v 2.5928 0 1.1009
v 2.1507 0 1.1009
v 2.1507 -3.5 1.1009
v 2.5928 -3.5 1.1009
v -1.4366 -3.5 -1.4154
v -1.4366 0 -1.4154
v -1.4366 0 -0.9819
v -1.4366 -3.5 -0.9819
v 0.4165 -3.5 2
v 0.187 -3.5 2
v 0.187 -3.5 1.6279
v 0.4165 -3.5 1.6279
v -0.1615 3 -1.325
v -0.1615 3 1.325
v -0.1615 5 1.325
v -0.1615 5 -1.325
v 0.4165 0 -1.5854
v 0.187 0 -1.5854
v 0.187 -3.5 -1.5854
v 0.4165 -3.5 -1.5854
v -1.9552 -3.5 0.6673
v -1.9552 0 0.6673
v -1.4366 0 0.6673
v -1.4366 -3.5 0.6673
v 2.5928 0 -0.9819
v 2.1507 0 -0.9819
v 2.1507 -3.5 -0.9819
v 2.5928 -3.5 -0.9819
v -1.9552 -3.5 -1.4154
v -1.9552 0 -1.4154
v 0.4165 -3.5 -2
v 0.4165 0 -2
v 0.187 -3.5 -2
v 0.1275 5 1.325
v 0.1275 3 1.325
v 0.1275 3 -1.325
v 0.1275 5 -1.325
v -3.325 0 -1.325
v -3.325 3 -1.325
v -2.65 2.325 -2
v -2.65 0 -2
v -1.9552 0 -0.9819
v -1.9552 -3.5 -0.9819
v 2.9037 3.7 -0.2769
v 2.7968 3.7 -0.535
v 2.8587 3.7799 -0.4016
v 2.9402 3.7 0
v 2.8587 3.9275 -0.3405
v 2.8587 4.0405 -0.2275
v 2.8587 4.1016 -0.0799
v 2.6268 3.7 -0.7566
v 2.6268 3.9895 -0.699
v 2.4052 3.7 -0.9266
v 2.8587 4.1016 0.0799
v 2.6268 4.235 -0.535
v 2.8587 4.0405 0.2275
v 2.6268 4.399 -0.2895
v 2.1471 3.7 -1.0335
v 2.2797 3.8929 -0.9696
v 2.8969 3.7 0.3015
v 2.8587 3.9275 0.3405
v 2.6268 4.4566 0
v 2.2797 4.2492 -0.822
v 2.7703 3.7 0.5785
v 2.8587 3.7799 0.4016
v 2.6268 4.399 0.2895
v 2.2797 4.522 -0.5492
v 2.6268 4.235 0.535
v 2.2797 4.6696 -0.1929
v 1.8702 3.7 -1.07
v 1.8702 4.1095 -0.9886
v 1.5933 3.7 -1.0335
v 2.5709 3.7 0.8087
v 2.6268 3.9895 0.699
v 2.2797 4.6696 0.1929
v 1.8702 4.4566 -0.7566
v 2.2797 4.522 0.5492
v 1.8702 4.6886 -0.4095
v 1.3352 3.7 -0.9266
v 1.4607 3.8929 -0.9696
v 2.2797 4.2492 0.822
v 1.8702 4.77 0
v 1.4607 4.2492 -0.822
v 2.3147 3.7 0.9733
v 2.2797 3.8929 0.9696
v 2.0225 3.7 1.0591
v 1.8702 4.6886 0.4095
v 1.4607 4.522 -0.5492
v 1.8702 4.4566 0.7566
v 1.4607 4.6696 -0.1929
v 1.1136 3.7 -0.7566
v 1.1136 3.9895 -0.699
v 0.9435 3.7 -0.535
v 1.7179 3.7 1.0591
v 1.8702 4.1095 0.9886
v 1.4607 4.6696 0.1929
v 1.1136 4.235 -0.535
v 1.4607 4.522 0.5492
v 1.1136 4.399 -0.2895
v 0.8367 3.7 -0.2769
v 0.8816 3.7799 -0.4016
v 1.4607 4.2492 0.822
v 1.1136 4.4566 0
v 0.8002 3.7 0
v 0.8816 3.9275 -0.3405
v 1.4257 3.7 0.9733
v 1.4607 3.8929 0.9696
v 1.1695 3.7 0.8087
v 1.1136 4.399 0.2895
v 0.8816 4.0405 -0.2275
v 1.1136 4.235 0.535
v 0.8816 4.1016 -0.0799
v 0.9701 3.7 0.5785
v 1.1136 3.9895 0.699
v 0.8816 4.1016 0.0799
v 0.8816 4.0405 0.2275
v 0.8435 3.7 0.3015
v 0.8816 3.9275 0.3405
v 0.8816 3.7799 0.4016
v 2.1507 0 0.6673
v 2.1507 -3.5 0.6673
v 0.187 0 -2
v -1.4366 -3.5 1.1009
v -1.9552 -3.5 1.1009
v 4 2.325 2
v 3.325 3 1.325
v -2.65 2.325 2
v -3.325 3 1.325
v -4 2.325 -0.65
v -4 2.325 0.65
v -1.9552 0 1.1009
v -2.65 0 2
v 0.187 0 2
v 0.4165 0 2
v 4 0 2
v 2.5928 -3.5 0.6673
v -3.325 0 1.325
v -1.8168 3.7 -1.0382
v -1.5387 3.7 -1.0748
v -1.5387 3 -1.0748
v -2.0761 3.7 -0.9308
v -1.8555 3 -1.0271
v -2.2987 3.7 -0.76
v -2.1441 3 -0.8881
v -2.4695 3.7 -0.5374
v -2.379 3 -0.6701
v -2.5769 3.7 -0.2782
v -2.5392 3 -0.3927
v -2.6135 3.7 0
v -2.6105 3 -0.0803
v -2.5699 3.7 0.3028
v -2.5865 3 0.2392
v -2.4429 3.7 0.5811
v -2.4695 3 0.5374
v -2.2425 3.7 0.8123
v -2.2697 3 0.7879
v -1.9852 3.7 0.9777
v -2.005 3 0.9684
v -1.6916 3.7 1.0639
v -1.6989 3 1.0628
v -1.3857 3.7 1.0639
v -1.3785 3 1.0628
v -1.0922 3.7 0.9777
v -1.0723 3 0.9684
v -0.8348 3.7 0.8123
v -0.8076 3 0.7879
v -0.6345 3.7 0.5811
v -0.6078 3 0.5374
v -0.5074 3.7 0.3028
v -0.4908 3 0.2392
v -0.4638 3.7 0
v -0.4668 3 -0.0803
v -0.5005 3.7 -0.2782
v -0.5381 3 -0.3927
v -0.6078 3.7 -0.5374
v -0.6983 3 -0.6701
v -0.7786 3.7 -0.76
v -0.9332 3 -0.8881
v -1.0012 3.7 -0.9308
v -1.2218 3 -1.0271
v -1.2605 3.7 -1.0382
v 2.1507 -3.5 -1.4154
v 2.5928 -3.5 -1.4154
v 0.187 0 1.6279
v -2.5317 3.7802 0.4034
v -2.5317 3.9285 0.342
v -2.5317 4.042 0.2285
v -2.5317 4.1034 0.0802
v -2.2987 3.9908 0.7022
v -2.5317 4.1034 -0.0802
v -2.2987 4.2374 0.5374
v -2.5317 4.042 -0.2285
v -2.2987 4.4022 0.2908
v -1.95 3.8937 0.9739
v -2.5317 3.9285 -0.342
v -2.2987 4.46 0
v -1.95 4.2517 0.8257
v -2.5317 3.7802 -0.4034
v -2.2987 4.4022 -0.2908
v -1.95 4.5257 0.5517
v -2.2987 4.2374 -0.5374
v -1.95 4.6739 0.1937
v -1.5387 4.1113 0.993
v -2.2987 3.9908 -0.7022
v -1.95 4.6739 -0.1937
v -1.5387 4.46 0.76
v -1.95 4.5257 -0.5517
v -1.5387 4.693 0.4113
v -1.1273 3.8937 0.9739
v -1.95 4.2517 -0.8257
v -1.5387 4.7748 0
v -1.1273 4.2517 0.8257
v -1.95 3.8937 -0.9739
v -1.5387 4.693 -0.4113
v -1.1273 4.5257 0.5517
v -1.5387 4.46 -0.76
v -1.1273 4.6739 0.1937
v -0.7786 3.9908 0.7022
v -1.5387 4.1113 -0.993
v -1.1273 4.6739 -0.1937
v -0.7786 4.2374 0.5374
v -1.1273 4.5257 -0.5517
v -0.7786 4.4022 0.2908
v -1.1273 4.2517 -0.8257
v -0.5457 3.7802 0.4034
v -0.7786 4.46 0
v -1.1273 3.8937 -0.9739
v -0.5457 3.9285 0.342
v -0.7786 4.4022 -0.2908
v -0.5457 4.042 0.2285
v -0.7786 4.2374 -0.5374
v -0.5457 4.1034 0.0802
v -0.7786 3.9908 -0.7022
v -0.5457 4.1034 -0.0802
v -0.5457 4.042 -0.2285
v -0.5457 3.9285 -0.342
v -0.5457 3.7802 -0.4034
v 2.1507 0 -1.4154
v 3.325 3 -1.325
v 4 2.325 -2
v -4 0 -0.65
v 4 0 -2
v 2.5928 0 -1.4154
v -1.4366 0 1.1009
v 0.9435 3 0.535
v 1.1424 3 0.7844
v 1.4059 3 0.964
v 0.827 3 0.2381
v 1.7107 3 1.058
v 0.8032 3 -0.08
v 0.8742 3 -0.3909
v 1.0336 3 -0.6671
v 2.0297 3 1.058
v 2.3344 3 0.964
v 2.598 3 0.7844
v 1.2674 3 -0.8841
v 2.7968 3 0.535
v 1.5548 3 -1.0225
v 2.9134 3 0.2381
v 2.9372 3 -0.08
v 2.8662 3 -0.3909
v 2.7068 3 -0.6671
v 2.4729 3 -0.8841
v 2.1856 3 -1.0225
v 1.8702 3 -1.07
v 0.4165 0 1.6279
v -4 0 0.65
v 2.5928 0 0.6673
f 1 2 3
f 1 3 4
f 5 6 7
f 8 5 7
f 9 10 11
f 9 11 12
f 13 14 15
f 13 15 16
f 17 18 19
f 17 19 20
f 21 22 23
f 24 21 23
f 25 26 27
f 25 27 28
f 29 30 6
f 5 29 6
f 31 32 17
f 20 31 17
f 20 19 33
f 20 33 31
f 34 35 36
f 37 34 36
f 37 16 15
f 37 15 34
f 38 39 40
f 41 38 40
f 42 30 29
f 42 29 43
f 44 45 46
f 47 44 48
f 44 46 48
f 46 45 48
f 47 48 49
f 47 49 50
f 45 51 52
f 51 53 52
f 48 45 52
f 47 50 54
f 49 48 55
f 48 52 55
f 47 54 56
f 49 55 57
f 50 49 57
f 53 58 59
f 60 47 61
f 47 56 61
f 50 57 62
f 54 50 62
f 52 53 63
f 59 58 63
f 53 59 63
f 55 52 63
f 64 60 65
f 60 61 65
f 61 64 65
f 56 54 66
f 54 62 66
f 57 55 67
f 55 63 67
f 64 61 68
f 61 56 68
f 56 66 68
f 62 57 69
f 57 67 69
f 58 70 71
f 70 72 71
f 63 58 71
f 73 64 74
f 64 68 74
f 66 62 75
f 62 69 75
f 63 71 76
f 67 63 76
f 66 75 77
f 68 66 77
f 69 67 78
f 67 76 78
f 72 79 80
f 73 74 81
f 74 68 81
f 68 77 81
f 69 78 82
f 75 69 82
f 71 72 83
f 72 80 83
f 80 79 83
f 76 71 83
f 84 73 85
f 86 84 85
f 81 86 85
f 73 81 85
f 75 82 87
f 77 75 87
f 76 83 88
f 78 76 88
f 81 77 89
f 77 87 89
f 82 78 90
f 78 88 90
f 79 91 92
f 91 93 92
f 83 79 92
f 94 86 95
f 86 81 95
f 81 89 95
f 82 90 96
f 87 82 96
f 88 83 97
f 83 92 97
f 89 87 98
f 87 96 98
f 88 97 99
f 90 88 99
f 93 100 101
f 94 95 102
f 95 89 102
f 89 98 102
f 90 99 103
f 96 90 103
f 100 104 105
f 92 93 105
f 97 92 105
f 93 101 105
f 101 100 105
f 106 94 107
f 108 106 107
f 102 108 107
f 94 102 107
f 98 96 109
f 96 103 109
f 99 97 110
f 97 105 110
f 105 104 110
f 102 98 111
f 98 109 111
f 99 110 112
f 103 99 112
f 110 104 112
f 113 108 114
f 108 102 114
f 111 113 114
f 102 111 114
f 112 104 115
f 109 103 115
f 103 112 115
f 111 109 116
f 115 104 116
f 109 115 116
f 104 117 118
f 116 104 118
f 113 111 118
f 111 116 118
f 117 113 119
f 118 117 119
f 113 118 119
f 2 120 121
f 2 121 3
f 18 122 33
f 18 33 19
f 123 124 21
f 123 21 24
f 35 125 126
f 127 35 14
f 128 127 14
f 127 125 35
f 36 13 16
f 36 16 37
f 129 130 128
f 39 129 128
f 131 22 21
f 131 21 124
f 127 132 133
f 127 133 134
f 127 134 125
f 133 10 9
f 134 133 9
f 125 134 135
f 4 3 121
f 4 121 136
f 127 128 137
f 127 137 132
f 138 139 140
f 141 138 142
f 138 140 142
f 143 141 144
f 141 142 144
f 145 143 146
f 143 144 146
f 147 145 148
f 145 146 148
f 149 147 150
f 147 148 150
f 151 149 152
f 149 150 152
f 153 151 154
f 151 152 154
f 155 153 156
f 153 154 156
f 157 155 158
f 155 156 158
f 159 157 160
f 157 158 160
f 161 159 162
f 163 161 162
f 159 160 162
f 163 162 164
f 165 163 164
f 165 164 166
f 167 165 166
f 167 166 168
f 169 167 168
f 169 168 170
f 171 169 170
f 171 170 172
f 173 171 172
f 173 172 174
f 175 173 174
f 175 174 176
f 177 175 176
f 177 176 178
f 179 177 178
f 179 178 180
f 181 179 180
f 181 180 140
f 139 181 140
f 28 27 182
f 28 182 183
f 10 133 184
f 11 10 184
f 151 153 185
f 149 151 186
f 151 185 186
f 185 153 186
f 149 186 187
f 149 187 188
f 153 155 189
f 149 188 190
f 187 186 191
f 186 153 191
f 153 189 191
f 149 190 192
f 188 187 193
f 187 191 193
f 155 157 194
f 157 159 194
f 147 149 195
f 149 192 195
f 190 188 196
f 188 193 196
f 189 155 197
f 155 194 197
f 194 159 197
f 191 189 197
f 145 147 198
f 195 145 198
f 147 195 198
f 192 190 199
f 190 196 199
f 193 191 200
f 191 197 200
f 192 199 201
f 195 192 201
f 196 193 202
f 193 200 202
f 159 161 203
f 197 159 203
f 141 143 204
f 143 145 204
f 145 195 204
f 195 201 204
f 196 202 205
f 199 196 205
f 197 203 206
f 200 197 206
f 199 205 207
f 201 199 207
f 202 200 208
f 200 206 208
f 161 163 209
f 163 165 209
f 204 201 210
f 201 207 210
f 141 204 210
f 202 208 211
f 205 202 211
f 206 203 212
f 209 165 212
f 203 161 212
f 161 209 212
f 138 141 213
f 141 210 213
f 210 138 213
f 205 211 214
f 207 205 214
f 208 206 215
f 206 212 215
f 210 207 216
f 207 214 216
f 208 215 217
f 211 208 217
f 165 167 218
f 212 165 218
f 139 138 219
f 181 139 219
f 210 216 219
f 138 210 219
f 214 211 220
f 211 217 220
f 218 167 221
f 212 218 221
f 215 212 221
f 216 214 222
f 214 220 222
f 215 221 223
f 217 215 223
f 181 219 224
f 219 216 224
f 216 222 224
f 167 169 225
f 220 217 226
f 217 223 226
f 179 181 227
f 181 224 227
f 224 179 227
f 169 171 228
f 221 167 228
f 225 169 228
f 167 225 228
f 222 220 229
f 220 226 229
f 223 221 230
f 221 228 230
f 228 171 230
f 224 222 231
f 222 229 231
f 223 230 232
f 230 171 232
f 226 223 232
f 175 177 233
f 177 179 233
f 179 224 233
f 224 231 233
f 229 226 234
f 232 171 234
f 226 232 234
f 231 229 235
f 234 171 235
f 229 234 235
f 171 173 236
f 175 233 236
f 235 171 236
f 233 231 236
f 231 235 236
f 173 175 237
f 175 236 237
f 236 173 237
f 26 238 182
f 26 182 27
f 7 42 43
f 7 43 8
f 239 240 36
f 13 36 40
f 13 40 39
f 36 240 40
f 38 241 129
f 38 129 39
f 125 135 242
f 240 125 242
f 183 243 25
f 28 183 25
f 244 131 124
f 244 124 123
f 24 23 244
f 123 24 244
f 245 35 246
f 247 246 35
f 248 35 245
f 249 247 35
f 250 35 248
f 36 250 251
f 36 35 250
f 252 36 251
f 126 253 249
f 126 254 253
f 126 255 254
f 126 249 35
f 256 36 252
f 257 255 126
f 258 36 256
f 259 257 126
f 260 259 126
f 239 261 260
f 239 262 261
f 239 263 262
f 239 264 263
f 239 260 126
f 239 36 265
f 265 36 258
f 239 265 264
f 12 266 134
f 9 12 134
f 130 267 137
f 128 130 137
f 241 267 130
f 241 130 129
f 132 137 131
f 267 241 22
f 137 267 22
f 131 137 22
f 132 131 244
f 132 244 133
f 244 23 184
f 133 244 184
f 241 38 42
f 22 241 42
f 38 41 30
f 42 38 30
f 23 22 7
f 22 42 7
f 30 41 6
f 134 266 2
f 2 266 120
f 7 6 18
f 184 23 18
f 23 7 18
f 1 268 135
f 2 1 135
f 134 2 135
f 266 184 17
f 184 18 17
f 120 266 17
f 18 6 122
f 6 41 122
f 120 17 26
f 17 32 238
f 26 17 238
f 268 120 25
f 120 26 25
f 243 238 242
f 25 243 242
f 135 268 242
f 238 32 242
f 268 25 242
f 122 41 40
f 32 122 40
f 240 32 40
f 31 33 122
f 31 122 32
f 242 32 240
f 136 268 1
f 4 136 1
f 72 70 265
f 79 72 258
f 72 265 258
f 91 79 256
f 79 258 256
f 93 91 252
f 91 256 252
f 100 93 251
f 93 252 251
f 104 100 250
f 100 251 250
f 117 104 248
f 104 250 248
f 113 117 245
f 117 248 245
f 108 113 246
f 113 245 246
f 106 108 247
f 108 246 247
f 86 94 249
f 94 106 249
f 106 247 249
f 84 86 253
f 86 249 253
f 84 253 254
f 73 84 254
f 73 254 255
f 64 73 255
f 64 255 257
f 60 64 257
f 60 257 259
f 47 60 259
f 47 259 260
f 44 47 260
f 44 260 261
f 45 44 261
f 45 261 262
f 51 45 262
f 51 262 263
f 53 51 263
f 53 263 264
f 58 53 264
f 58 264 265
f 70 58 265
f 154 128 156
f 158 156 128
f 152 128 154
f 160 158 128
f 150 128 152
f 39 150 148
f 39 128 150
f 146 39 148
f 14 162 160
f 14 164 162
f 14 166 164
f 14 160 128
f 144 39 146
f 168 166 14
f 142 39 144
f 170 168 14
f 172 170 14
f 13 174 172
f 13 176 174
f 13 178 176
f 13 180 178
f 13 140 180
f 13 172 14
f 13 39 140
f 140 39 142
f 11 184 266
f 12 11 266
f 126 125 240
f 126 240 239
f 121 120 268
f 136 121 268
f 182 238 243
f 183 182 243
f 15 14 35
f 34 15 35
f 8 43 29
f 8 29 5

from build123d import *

# Parameters (mm, degrees)
SKETCH_1_W          = 8
SKETCH_1_H          = 4
EXTRUDE_1_DEPTH     = 3
CUT_EXTRUDE_1_DEPTH = 10
CUT_EXTRUDE_2_DEPTH = 10
CUT_EXTRUDE_3_DEPTH = 10
SKETCH_5_W          = 0.28903002
SKETCH_5_H          = 2.650043114
EXTRUDE_2_DEPTH     = 2
SKETCH_6_R          = 1.074823955
EXTRUDE_3_DEPTH     = 0.7
SKETCH_8_R          = 1.07
EXTRUDE_4_DEPTH     = 0.7
SKETCH_13_W         = 0.51855386
SKETCH_13_H         = 0.433545031
SKETCH_13_W_2       = 0.442045914
EXTRUDE_5_DEPTH     = 3.5
SKETCH_14_W         = 0.22952384
SKETCH_14_H         = 0.414585327
EXTRUDE_6_DEPTH     = 3.5


with BuildPart() as part:
    # 草图1 → 凸台-拉伸1 (new body)
    with BuildSketch(Plane(origin=(0, 0, 0), x_dir=(1, 0, 0), z_dir=(0, 1, 0))):
        Rectangle(SKETCH_1_W, SKETCH_1_H)
    extrude(amount=EXTRUDE_1_DEPTH)

    # 草图2 → 切除-拉伸1 (cut)
    with BuildSketch(Plane.ZY.offset(4)):
        Polygon((-2, 2.325021557), (-1.325021557, 3), (-2, 3), align=None)
        Polygon((2, 2.325021557), (1.325021557, 3), (2, 3), align=None)
    extrude(amount=-CUT_EXTRUDE_1_DEPTH, mode=Mode.SUBTRACT)

    # 草图3 → 切除-拉伸2 (cut)
    with BuildSketch(Plane.XY.offset(2)):
        Polygon((-4, 2.325021557), (-3.325021557, 3), (-4, 3), align=None)
        Polygon((4, 2.325021557), (3.325021557, 3), (4, 3), align=None)
    extrude(amount=-CUT_EXTRUDE_2_DEPTH, mode=Mode.SUBTRACT)

    # 草图4 → 切除-拉伸3 (cut)
    with BuildSketch(Plane(origin=(0, 3, 0), x_dir=(1, 0, 0), z_dir=(0, 1, 0))):
        Polygon((-3.325021557, 1.325021557), (-2.650043113, 2), (-4, 2), (-4, 0.650043113), align=None)
        Polygon((-3.325021557, -1.325021557), (-2.650043113, -2), (-4, -2), (-4, -0.650043113), align=None)
    extrude(amount=-CUT_EXTRUDE_3_DEPTH, mode=Mode.SUBTRACT)

    # 草图5 → 凸台-拉伸2 (add)
    with BuildSketch(Plane(origin=(0, 3, 0), x_dir=(1, 0, 0), z_dir=(0, 1, 0))):
        with Locations((-0.017001766, 0)):
            Rectangle(SKETCH_5_W, SKETCH_5_H)
    extrude(amount=EXTRUDE_2_DEPTH)

    # 草图6 → 凸台-拉伸3 (add)
    with BuildSketch(Plane(origin=(0, 3, 0), x_dir=(1, 0, 0), z_dir=(0, 1, 0))):
        with Locations(Location((-1.538659816, 0, 0), (0, 0, 90))):
            Circle(SKETCH_6_R)
    extrude(amount=EXTRUDE_3_DEPTH)

    # 草图7 → 旋转1 (revolve)
    with BuildSketch(Plane(origin=(0, 3.7, 0), x_dir=(1, 0, 0), z_dir=(0, 1, 0))):
        with BuildLine():
            Line((-0.463835861, 0), (-2.613483771, 0))
            ThreePointArc((-2.613483771, 0), (-1.538659816, -1.074823955), (-0.463835861, 0))
        make_face()
    revolve(axis=Axis((-0.463835861, 3.7, 0), (-1, 0, 0)))

    # 草图8 → 凸台-拉伸4 (add)
    with BuildSketch(Plane(origin=(0, 3, 0), x_dir=(1, 0, 0), z_dir=(0, 1, 0))):
        with Locations(Location((1.870194252, 0, 0), (0, 0, 90))):
            Circle(SKETCH_8_R)
    extrude(amount=EXTRUDE_4_DEPTH)

    # 草图12 → 旋转2 (revolve)
    with BuildSketch(Plane(origin=(0, 3.7, 0), x_dir=(1, 0, 0), z_dir=(0, 1, 0))):
        with BuildLine():
            Line((0.800194252, 0), (2.940194252, 0))
            ThreePointArc((2.940194252, 0), (1.870194252, -1.07), (0.800194252, 0))
        make_face()
    revolve(axis=Axis((0.800194252, 3.7, 0), (1, 0, 0)))

    # 草图13 → 凸台-拉伸5 (add)
    with BuildSketch(Plane.XZ):
        with Locations((-1.695926151, 0.884091829)):
            Rectangle(SKETCH_13_W, SKETCH_13_H)
        with Locations((-1.695926151, -1.198624497)):
            Rectangle(SKETCH_13_W, SKETCH_13_H)
        with Locations((2.371746347, 0.884091829)):
            Rectangle(SKETCH_13_W_2, SKETCH_13_H)
        with Locations((2.371746347, -1.198624497)):
            Rectangle(SKETCH_13_W_2, SKETCH_13_H)
    extrude(amount=EXTRUDE_5_DEPTH)

    # 草图14 → 凸台-拉伸6 (add)
    with BuildSketch(Plane.XZ):
        Polygon((0.187019425, 2), (0.187019425, 1.627919087), (0.416543265, 1.627919087), (0.416543265, 1.942451757), (0.416543265, 2), align=None)
        with Locations((0.301781345, -1.792707336)):
            Rectangle(SKETCH_14_W, SKETCH_14_H)
    extrude(amount=EXTRUDE_6_DEPTH)


solid = part.part
